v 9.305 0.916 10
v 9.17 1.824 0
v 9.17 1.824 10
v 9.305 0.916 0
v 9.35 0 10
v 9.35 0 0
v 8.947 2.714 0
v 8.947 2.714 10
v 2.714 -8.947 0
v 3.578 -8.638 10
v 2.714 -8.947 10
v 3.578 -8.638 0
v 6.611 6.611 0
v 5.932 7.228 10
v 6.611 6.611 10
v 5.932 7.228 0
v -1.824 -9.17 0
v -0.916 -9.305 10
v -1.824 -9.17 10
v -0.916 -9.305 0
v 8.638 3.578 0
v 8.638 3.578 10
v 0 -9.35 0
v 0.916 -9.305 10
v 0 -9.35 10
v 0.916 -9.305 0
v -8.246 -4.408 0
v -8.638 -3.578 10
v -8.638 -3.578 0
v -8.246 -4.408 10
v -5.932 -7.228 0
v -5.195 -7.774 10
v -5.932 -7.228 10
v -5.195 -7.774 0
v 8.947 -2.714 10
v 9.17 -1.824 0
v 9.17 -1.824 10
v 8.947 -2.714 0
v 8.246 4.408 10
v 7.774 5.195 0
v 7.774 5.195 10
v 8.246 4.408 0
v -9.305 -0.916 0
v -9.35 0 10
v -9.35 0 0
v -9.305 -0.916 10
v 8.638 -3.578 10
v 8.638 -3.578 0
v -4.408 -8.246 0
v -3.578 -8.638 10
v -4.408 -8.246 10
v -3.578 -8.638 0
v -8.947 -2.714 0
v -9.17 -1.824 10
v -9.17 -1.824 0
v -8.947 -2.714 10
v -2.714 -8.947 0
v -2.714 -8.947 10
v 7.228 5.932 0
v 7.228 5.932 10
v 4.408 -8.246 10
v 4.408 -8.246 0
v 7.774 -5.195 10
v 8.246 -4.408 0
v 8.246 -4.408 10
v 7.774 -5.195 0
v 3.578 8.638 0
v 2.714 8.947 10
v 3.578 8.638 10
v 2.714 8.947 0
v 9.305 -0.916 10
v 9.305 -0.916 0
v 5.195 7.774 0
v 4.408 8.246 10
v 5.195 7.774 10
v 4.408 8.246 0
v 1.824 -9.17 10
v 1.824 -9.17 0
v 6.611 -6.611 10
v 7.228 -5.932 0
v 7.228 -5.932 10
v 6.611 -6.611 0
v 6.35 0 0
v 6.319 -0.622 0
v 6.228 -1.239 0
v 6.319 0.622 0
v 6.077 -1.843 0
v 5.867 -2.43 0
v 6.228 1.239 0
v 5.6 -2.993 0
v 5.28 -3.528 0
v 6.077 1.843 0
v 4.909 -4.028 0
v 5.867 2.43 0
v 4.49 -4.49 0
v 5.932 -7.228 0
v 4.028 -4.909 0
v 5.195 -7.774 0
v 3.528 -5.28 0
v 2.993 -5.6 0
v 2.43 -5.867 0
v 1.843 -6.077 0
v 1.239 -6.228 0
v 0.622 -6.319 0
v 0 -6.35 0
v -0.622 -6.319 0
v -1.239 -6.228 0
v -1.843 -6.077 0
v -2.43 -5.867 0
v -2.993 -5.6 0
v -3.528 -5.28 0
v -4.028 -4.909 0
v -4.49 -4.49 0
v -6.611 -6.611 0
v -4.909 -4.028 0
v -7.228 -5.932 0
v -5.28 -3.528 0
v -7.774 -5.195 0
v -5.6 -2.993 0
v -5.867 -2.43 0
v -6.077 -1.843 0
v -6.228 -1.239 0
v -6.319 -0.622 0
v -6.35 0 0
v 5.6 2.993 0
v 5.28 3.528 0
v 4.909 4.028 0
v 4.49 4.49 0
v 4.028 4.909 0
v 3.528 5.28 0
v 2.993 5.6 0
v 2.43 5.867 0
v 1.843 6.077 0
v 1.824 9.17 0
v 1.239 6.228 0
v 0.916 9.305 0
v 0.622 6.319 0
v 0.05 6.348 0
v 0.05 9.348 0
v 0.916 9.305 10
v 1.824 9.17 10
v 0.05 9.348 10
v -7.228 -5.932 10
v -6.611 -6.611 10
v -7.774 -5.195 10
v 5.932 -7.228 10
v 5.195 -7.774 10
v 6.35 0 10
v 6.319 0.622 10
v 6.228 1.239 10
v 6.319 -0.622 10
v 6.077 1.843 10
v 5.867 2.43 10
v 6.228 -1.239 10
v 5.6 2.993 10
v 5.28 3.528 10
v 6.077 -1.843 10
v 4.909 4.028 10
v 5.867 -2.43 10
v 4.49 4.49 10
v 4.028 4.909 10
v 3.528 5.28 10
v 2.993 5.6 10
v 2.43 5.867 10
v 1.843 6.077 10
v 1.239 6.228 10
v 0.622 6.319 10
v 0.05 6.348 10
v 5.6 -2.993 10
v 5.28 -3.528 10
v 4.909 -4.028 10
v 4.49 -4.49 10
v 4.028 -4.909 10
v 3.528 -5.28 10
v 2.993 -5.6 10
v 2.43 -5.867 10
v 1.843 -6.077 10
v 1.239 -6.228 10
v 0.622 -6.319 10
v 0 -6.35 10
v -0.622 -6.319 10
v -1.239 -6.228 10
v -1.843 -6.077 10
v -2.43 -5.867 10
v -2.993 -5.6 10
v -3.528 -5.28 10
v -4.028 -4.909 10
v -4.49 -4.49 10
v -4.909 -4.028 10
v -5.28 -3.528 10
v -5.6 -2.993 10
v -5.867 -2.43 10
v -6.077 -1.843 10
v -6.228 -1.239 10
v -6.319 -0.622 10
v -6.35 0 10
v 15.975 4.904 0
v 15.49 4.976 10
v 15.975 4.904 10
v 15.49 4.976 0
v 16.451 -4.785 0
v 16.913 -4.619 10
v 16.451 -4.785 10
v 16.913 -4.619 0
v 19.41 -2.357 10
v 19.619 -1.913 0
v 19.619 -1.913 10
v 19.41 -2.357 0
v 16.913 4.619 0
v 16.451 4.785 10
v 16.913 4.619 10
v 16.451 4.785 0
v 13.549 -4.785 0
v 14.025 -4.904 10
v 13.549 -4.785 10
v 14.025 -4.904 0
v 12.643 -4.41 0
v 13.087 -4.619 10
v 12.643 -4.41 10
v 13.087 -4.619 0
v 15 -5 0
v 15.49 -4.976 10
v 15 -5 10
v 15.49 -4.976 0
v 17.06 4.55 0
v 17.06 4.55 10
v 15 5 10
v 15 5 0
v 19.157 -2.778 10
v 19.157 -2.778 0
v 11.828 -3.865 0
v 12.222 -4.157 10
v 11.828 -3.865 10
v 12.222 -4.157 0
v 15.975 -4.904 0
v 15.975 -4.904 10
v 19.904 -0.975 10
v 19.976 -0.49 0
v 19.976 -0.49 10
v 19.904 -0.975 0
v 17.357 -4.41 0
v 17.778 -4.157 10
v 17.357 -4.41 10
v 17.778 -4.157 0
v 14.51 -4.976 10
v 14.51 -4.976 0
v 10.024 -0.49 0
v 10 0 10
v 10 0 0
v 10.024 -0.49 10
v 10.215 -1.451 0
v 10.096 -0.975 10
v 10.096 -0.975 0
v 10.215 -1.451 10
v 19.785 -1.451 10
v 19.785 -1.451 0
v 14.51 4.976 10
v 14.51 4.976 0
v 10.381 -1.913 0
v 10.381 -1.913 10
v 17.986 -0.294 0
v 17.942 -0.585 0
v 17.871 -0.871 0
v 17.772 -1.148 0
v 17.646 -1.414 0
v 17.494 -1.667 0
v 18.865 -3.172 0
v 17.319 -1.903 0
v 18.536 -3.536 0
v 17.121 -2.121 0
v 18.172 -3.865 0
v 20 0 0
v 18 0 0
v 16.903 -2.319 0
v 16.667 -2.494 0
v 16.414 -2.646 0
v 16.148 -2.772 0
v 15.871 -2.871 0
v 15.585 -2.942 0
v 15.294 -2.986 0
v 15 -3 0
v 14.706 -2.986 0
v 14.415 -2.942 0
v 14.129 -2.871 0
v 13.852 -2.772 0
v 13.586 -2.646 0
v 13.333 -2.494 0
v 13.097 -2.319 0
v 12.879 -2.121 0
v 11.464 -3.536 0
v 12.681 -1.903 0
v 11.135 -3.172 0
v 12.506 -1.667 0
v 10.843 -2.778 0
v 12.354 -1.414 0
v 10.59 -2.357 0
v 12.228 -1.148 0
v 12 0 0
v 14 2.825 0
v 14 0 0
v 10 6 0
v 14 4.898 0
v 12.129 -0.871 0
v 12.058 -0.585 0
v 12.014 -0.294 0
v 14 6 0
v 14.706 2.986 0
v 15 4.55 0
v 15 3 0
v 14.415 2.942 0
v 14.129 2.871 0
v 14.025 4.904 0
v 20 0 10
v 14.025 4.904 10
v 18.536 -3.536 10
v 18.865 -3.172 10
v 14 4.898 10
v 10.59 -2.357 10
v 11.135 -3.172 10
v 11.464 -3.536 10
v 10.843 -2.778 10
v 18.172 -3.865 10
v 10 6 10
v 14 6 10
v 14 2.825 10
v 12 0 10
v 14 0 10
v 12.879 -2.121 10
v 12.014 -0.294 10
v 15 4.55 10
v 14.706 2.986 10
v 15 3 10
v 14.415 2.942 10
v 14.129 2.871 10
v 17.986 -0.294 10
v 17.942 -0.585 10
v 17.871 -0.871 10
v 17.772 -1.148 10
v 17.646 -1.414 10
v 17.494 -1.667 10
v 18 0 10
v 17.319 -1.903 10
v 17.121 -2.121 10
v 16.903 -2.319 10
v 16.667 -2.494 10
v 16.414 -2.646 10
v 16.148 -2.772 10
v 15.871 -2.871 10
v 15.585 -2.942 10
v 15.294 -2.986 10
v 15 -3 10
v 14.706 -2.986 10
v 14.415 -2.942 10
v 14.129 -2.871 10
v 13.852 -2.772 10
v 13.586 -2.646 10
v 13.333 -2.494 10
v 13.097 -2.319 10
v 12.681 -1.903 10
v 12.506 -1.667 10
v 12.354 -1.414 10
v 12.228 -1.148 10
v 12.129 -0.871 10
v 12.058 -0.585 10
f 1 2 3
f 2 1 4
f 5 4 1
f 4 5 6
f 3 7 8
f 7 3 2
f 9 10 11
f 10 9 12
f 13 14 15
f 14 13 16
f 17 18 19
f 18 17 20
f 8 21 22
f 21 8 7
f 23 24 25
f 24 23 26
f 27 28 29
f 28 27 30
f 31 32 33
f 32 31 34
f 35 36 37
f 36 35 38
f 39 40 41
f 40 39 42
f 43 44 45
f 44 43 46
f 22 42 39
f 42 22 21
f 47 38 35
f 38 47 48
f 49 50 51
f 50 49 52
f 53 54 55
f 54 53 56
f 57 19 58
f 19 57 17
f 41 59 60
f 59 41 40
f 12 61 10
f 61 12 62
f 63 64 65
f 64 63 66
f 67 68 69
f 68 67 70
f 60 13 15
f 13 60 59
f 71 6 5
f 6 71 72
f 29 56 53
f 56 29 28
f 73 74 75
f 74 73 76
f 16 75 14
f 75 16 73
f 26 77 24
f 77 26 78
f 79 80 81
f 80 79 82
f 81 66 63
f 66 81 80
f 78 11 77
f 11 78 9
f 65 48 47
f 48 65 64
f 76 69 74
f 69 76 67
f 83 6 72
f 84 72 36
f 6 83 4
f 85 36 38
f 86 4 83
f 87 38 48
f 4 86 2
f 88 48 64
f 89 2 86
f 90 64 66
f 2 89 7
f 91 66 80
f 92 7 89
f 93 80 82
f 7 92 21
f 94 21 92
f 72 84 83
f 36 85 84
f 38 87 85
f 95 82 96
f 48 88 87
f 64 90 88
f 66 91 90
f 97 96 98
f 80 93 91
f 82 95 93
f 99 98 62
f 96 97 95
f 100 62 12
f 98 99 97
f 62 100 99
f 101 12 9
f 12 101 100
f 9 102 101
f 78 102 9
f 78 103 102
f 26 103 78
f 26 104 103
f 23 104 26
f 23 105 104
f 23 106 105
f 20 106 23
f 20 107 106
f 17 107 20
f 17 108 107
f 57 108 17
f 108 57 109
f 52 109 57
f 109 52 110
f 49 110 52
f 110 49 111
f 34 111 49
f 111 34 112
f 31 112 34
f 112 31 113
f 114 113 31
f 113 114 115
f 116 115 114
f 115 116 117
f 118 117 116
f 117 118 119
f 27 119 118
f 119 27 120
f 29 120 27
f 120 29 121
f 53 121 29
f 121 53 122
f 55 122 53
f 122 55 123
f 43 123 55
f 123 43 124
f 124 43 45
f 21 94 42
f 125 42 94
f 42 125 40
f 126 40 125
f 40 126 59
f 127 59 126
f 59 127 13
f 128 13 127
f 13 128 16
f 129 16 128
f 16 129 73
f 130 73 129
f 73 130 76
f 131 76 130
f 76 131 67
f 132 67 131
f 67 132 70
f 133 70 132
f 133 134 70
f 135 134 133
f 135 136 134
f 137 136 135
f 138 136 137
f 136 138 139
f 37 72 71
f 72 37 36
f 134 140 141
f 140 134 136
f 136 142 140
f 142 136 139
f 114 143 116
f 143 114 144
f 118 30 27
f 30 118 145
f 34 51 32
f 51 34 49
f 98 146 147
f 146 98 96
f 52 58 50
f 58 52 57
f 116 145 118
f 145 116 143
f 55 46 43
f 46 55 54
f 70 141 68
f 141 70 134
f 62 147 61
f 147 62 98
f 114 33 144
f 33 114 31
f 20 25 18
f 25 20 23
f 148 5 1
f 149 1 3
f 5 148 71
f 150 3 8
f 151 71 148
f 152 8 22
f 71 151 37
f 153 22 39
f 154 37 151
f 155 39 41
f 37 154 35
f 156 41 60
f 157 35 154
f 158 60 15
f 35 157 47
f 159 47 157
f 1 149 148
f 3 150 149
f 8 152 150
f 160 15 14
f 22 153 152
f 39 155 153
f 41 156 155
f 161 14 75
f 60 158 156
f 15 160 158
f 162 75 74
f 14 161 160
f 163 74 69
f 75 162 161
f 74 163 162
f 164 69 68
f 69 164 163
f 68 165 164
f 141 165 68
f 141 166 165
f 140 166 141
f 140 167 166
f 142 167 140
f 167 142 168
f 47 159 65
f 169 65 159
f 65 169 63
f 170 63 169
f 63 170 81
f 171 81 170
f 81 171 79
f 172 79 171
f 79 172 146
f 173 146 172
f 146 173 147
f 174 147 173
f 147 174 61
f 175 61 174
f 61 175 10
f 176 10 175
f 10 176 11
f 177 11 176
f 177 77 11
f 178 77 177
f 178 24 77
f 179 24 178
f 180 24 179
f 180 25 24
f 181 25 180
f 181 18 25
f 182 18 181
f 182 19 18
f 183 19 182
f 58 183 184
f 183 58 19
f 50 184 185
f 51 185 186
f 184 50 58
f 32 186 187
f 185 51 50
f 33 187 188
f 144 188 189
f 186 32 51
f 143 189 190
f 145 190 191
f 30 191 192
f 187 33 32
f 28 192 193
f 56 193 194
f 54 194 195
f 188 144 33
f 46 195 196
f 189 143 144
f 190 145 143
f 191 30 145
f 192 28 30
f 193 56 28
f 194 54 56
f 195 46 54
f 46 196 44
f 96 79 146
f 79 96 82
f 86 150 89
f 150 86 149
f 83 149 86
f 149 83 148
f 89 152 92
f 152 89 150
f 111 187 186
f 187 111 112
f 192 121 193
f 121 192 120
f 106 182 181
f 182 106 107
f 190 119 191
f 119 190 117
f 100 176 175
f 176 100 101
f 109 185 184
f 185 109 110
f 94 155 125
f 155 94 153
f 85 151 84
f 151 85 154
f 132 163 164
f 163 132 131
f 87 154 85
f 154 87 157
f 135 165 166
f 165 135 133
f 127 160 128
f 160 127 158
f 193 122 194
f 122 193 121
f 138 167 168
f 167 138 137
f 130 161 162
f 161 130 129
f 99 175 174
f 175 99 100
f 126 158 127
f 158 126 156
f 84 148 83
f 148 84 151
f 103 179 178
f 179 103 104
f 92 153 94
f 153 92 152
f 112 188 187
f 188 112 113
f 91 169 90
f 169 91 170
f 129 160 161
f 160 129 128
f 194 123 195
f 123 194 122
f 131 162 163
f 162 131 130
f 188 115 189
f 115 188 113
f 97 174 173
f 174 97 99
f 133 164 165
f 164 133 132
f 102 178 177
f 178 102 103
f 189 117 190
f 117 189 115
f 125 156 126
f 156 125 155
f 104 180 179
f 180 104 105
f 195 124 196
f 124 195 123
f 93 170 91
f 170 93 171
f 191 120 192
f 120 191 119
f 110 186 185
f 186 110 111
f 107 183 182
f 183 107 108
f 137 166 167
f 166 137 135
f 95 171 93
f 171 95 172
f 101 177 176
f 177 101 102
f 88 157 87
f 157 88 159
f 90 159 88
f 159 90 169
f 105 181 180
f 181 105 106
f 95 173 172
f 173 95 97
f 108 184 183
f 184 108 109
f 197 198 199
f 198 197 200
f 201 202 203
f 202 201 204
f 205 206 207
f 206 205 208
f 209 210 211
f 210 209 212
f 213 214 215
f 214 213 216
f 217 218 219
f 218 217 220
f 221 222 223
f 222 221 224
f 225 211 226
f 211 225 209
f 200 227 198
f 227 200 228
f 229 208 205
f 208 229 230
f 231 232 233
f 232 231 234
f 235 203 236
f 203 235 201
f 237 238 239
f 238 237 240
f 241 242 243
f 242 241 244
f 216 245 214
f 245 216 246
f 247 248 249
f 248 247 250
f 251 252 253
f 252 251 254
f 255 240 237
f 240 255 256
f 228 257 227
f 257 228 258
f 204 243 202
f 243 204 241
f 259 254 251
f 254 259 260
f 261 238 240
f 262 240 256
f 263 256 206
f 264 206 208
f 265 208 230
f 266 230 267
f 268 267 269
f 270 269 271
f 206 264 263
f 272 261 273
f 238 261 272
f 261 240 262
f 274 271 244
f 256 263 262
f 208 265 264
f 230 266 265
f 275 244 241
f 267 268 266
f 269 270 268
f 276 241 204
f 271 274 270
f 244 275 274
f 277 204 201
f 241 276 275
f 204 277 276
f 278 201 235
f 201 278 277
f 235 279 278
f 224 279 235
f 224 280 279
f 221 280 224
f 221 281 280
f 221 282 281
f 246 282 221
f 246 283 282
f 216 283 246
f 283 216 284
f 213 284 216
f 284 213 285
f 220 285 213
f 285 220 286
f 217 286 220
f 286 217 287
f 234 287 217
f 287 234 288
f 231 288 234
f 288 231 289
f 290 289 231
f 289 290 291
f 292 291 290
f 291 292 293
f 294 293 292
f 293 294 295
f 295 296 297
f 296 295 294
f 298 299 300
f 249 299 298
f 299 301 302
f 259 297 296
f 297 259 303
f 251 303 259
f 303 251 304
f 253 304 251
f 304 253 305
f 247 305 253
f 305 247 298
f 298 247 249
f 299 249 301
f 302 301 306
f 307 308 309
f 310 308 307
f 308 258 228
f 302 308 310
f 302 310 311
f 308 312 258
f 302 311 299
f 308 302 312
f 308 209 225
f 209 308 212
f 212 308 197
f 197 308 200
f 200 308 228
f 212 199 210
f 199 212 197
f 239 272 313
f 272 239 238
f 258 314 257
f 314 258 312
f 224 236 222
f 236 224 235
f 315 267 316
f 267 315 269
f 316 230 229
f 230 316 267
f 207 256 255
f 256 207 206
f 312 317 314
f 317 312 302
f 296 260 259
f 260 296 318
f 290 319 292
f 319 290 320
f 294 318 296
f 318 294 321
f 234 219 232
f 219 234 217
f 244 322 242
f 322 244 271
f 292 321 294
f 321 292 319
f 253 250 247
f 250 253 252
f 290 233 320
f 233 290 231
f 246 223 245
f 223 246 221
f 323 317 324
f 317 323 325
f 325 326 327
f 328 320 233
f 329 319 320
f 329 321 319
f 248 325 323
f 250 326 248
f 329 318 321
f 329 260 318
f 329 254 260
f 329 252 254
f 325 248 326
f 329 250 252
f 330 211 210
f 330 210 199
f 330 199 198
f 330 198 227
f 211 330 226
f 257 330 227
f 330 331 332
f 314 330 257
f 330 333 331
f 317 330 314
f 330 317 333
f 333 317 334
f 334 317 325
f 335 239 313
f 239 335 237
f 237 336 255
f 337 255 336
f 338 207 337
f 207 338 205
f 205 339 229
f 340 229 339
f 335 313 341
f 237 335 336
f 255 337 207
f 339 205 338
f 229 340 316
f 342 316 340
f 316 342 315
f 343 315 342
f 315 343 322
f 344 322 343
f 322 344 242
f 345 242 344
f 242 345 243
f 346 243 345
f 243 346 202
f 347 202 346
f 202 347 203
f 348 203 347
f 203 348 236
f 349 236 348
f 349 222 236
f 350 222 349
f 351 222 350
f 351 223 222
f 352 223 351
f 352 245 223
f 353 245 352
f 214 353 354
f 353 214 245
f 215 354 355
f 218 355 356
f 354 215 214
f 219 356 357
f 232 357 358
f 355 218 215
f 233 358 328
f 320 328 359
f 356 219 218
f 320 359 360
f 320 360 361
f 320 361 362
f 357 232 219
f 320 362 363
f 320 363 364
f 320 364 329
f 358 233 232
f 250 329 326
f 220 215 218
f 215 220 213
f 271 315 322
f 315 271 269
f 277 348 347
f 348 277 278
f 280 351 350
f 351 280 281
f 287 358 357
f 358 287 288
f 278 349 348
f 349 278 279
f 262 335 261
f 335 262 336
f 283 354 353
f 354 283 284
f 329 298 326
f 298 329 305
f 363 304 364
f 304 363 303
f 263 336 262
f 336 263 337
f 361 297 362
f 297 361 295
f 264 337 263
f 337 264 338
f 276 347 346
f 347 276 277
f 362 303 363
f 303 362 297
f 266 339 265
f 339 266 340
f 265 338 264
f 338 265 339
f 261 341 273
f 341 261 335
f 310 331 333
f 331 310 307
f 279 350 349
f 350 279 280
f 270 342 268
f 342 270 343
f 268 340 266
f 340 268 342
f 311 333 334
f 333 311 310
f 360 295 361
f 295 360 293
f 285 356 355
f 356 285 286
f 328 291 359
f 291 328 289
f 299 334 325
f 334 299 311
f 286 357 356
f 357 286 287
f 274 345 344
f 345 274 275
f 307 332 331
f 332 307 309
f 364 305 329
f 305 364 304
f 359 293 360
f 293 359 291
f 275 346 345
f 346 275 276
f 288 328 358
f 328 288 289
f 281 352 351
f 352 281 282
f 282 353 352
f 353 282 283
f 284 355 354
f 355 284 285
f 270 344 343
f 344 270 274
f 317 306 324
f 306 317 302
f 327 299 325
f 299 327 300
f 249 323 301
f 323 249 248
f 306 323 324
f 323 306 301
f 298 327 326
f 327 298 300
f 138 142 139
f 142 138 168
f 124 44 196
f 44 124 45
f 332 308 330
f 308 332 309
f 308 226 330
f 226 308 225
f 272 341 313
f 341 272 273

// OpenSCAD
// Snap-on Clip for Lab Stand Rod and Tubing
// Units: Millimetres
// Orientation: Flat on XY plane, builds upward (+Z), centred on origin

$fn = 64;

// --- Dimensions ---
Z_HEIGHT = 10;
ROD_ID = 12.7;
ROD_WALL = 3;
ROD_OD = 18.7;
ROD_CENTER_X = 0;
ROD_CENTER_Y = 0;
ROD_CUT_Y_LIMIT = 5;
ROD_CUT_X_LIMIT = 0; // Cut is x < 0

TUBING_ID = 6;
TUBING_WALL = 2;
TUBING_OD = 10;
TUBING_CENTER_X = 15;
TUBING_CENTER_Y = 0;
TUBING_CUT_Y_LIMIT = 2.25;
TUBING_CUT_X_LIMIT = 15; // Cut is x > 15

BRIDGE_WIDTH_Y = 6;
BRIDGE_X_START = 8;
BRIDGE_X_END = 12;

// --- Derived Dimensions ---
ROD_RADIUS_OUT = ROD_OD / 2;
ROD_RADIUS_IN = ROD_ID / 2;
TUBING_RADIUS_OUT = TUBING_OD / 2;
TUBING_RADIUS_IN = TUBING_ID / 2;
BRIDGE_X_WIDTH = BRIDGE_X_END - BRIDGE_X_START;
BRIDGE_X_CENTER = (BRIDGE_X_START + BRIDGE_X_END) / 2;
BRIDGE_Y_HALF = BRIDGE_WIDTH_Y / 2;

// --- Cut Tolerances ---
CUT_Z_TOL = 0.05;
CUT_X_TOL = 0.05;
CUT_Y_TOL = 0.05;

// --- Module: Rod Ring ---
module rod_ring() {
    translate([ROD_CENTER_X, ROD_CENTER_Y, 0])
    difference() {
        cylinder(h = Z_HEIGHT, r = ROD_RADIUS_OUT, $fn = 64);
        cylinder(h = Z_HEIGHT, r = ROD_RADIUS_IN, $fn = 64);
    }
}

// --- Module: Tubing Ring ---
module tubing_ring() {
    translate([TUBING_CENTER_X, TUBING_CENTER_Y, 0])
    difference() {
        cylinder(h = Z_HEIGHT, r = TUBING_RADIUS_OUT, $fn = 64);
        cylinder(h = Z_HEIGHT, r = TUBING_RADIUS_IN, $fn = 64);
    }
}

// --- Module: Bridge ---
module bridge() {
    translate([BRIDGE_X_CENTER, 0, 0])
    cube([BRIDGE_X_WIDTH, BRIDGE_WIDTH_Y, Z_HEIGHT]);
}

// --- Module: Rod Cut ---
module rod_cut() {
    // Cut x < 0, -5 < y < 5
    translate([-ROD_RADIUS_OUT, 0, 0])
    cube([ROD_RADIUS_OUT + CUT_X_TOL, ROD_CUT_Y_LIMIT * 2 + CUT_Y_TOL, Z_HEIGHT + CUT_Z_TOL]);
}

// --- Module: Tubing Cut ---
module tubing_cut() {
    // Cut x > 15, -2.25 < y < 2.25
    translate([TUBING_CENTER_X, 0, 0])
    cube([TUBING_RADIUS_OUT + CUT_X_TOL, TUBING_CUT_Y_LIMIT * 2 + CUT_Y_TOL, Z_HEIGHT + CUT_Z_TOL]);
}

// --- Main Assembly ---
difference() {
    union() {
        rod_ring();
        tubing_ring();
        bridge();
    };
    
    rod_cut();
    tubing_cut();
}
